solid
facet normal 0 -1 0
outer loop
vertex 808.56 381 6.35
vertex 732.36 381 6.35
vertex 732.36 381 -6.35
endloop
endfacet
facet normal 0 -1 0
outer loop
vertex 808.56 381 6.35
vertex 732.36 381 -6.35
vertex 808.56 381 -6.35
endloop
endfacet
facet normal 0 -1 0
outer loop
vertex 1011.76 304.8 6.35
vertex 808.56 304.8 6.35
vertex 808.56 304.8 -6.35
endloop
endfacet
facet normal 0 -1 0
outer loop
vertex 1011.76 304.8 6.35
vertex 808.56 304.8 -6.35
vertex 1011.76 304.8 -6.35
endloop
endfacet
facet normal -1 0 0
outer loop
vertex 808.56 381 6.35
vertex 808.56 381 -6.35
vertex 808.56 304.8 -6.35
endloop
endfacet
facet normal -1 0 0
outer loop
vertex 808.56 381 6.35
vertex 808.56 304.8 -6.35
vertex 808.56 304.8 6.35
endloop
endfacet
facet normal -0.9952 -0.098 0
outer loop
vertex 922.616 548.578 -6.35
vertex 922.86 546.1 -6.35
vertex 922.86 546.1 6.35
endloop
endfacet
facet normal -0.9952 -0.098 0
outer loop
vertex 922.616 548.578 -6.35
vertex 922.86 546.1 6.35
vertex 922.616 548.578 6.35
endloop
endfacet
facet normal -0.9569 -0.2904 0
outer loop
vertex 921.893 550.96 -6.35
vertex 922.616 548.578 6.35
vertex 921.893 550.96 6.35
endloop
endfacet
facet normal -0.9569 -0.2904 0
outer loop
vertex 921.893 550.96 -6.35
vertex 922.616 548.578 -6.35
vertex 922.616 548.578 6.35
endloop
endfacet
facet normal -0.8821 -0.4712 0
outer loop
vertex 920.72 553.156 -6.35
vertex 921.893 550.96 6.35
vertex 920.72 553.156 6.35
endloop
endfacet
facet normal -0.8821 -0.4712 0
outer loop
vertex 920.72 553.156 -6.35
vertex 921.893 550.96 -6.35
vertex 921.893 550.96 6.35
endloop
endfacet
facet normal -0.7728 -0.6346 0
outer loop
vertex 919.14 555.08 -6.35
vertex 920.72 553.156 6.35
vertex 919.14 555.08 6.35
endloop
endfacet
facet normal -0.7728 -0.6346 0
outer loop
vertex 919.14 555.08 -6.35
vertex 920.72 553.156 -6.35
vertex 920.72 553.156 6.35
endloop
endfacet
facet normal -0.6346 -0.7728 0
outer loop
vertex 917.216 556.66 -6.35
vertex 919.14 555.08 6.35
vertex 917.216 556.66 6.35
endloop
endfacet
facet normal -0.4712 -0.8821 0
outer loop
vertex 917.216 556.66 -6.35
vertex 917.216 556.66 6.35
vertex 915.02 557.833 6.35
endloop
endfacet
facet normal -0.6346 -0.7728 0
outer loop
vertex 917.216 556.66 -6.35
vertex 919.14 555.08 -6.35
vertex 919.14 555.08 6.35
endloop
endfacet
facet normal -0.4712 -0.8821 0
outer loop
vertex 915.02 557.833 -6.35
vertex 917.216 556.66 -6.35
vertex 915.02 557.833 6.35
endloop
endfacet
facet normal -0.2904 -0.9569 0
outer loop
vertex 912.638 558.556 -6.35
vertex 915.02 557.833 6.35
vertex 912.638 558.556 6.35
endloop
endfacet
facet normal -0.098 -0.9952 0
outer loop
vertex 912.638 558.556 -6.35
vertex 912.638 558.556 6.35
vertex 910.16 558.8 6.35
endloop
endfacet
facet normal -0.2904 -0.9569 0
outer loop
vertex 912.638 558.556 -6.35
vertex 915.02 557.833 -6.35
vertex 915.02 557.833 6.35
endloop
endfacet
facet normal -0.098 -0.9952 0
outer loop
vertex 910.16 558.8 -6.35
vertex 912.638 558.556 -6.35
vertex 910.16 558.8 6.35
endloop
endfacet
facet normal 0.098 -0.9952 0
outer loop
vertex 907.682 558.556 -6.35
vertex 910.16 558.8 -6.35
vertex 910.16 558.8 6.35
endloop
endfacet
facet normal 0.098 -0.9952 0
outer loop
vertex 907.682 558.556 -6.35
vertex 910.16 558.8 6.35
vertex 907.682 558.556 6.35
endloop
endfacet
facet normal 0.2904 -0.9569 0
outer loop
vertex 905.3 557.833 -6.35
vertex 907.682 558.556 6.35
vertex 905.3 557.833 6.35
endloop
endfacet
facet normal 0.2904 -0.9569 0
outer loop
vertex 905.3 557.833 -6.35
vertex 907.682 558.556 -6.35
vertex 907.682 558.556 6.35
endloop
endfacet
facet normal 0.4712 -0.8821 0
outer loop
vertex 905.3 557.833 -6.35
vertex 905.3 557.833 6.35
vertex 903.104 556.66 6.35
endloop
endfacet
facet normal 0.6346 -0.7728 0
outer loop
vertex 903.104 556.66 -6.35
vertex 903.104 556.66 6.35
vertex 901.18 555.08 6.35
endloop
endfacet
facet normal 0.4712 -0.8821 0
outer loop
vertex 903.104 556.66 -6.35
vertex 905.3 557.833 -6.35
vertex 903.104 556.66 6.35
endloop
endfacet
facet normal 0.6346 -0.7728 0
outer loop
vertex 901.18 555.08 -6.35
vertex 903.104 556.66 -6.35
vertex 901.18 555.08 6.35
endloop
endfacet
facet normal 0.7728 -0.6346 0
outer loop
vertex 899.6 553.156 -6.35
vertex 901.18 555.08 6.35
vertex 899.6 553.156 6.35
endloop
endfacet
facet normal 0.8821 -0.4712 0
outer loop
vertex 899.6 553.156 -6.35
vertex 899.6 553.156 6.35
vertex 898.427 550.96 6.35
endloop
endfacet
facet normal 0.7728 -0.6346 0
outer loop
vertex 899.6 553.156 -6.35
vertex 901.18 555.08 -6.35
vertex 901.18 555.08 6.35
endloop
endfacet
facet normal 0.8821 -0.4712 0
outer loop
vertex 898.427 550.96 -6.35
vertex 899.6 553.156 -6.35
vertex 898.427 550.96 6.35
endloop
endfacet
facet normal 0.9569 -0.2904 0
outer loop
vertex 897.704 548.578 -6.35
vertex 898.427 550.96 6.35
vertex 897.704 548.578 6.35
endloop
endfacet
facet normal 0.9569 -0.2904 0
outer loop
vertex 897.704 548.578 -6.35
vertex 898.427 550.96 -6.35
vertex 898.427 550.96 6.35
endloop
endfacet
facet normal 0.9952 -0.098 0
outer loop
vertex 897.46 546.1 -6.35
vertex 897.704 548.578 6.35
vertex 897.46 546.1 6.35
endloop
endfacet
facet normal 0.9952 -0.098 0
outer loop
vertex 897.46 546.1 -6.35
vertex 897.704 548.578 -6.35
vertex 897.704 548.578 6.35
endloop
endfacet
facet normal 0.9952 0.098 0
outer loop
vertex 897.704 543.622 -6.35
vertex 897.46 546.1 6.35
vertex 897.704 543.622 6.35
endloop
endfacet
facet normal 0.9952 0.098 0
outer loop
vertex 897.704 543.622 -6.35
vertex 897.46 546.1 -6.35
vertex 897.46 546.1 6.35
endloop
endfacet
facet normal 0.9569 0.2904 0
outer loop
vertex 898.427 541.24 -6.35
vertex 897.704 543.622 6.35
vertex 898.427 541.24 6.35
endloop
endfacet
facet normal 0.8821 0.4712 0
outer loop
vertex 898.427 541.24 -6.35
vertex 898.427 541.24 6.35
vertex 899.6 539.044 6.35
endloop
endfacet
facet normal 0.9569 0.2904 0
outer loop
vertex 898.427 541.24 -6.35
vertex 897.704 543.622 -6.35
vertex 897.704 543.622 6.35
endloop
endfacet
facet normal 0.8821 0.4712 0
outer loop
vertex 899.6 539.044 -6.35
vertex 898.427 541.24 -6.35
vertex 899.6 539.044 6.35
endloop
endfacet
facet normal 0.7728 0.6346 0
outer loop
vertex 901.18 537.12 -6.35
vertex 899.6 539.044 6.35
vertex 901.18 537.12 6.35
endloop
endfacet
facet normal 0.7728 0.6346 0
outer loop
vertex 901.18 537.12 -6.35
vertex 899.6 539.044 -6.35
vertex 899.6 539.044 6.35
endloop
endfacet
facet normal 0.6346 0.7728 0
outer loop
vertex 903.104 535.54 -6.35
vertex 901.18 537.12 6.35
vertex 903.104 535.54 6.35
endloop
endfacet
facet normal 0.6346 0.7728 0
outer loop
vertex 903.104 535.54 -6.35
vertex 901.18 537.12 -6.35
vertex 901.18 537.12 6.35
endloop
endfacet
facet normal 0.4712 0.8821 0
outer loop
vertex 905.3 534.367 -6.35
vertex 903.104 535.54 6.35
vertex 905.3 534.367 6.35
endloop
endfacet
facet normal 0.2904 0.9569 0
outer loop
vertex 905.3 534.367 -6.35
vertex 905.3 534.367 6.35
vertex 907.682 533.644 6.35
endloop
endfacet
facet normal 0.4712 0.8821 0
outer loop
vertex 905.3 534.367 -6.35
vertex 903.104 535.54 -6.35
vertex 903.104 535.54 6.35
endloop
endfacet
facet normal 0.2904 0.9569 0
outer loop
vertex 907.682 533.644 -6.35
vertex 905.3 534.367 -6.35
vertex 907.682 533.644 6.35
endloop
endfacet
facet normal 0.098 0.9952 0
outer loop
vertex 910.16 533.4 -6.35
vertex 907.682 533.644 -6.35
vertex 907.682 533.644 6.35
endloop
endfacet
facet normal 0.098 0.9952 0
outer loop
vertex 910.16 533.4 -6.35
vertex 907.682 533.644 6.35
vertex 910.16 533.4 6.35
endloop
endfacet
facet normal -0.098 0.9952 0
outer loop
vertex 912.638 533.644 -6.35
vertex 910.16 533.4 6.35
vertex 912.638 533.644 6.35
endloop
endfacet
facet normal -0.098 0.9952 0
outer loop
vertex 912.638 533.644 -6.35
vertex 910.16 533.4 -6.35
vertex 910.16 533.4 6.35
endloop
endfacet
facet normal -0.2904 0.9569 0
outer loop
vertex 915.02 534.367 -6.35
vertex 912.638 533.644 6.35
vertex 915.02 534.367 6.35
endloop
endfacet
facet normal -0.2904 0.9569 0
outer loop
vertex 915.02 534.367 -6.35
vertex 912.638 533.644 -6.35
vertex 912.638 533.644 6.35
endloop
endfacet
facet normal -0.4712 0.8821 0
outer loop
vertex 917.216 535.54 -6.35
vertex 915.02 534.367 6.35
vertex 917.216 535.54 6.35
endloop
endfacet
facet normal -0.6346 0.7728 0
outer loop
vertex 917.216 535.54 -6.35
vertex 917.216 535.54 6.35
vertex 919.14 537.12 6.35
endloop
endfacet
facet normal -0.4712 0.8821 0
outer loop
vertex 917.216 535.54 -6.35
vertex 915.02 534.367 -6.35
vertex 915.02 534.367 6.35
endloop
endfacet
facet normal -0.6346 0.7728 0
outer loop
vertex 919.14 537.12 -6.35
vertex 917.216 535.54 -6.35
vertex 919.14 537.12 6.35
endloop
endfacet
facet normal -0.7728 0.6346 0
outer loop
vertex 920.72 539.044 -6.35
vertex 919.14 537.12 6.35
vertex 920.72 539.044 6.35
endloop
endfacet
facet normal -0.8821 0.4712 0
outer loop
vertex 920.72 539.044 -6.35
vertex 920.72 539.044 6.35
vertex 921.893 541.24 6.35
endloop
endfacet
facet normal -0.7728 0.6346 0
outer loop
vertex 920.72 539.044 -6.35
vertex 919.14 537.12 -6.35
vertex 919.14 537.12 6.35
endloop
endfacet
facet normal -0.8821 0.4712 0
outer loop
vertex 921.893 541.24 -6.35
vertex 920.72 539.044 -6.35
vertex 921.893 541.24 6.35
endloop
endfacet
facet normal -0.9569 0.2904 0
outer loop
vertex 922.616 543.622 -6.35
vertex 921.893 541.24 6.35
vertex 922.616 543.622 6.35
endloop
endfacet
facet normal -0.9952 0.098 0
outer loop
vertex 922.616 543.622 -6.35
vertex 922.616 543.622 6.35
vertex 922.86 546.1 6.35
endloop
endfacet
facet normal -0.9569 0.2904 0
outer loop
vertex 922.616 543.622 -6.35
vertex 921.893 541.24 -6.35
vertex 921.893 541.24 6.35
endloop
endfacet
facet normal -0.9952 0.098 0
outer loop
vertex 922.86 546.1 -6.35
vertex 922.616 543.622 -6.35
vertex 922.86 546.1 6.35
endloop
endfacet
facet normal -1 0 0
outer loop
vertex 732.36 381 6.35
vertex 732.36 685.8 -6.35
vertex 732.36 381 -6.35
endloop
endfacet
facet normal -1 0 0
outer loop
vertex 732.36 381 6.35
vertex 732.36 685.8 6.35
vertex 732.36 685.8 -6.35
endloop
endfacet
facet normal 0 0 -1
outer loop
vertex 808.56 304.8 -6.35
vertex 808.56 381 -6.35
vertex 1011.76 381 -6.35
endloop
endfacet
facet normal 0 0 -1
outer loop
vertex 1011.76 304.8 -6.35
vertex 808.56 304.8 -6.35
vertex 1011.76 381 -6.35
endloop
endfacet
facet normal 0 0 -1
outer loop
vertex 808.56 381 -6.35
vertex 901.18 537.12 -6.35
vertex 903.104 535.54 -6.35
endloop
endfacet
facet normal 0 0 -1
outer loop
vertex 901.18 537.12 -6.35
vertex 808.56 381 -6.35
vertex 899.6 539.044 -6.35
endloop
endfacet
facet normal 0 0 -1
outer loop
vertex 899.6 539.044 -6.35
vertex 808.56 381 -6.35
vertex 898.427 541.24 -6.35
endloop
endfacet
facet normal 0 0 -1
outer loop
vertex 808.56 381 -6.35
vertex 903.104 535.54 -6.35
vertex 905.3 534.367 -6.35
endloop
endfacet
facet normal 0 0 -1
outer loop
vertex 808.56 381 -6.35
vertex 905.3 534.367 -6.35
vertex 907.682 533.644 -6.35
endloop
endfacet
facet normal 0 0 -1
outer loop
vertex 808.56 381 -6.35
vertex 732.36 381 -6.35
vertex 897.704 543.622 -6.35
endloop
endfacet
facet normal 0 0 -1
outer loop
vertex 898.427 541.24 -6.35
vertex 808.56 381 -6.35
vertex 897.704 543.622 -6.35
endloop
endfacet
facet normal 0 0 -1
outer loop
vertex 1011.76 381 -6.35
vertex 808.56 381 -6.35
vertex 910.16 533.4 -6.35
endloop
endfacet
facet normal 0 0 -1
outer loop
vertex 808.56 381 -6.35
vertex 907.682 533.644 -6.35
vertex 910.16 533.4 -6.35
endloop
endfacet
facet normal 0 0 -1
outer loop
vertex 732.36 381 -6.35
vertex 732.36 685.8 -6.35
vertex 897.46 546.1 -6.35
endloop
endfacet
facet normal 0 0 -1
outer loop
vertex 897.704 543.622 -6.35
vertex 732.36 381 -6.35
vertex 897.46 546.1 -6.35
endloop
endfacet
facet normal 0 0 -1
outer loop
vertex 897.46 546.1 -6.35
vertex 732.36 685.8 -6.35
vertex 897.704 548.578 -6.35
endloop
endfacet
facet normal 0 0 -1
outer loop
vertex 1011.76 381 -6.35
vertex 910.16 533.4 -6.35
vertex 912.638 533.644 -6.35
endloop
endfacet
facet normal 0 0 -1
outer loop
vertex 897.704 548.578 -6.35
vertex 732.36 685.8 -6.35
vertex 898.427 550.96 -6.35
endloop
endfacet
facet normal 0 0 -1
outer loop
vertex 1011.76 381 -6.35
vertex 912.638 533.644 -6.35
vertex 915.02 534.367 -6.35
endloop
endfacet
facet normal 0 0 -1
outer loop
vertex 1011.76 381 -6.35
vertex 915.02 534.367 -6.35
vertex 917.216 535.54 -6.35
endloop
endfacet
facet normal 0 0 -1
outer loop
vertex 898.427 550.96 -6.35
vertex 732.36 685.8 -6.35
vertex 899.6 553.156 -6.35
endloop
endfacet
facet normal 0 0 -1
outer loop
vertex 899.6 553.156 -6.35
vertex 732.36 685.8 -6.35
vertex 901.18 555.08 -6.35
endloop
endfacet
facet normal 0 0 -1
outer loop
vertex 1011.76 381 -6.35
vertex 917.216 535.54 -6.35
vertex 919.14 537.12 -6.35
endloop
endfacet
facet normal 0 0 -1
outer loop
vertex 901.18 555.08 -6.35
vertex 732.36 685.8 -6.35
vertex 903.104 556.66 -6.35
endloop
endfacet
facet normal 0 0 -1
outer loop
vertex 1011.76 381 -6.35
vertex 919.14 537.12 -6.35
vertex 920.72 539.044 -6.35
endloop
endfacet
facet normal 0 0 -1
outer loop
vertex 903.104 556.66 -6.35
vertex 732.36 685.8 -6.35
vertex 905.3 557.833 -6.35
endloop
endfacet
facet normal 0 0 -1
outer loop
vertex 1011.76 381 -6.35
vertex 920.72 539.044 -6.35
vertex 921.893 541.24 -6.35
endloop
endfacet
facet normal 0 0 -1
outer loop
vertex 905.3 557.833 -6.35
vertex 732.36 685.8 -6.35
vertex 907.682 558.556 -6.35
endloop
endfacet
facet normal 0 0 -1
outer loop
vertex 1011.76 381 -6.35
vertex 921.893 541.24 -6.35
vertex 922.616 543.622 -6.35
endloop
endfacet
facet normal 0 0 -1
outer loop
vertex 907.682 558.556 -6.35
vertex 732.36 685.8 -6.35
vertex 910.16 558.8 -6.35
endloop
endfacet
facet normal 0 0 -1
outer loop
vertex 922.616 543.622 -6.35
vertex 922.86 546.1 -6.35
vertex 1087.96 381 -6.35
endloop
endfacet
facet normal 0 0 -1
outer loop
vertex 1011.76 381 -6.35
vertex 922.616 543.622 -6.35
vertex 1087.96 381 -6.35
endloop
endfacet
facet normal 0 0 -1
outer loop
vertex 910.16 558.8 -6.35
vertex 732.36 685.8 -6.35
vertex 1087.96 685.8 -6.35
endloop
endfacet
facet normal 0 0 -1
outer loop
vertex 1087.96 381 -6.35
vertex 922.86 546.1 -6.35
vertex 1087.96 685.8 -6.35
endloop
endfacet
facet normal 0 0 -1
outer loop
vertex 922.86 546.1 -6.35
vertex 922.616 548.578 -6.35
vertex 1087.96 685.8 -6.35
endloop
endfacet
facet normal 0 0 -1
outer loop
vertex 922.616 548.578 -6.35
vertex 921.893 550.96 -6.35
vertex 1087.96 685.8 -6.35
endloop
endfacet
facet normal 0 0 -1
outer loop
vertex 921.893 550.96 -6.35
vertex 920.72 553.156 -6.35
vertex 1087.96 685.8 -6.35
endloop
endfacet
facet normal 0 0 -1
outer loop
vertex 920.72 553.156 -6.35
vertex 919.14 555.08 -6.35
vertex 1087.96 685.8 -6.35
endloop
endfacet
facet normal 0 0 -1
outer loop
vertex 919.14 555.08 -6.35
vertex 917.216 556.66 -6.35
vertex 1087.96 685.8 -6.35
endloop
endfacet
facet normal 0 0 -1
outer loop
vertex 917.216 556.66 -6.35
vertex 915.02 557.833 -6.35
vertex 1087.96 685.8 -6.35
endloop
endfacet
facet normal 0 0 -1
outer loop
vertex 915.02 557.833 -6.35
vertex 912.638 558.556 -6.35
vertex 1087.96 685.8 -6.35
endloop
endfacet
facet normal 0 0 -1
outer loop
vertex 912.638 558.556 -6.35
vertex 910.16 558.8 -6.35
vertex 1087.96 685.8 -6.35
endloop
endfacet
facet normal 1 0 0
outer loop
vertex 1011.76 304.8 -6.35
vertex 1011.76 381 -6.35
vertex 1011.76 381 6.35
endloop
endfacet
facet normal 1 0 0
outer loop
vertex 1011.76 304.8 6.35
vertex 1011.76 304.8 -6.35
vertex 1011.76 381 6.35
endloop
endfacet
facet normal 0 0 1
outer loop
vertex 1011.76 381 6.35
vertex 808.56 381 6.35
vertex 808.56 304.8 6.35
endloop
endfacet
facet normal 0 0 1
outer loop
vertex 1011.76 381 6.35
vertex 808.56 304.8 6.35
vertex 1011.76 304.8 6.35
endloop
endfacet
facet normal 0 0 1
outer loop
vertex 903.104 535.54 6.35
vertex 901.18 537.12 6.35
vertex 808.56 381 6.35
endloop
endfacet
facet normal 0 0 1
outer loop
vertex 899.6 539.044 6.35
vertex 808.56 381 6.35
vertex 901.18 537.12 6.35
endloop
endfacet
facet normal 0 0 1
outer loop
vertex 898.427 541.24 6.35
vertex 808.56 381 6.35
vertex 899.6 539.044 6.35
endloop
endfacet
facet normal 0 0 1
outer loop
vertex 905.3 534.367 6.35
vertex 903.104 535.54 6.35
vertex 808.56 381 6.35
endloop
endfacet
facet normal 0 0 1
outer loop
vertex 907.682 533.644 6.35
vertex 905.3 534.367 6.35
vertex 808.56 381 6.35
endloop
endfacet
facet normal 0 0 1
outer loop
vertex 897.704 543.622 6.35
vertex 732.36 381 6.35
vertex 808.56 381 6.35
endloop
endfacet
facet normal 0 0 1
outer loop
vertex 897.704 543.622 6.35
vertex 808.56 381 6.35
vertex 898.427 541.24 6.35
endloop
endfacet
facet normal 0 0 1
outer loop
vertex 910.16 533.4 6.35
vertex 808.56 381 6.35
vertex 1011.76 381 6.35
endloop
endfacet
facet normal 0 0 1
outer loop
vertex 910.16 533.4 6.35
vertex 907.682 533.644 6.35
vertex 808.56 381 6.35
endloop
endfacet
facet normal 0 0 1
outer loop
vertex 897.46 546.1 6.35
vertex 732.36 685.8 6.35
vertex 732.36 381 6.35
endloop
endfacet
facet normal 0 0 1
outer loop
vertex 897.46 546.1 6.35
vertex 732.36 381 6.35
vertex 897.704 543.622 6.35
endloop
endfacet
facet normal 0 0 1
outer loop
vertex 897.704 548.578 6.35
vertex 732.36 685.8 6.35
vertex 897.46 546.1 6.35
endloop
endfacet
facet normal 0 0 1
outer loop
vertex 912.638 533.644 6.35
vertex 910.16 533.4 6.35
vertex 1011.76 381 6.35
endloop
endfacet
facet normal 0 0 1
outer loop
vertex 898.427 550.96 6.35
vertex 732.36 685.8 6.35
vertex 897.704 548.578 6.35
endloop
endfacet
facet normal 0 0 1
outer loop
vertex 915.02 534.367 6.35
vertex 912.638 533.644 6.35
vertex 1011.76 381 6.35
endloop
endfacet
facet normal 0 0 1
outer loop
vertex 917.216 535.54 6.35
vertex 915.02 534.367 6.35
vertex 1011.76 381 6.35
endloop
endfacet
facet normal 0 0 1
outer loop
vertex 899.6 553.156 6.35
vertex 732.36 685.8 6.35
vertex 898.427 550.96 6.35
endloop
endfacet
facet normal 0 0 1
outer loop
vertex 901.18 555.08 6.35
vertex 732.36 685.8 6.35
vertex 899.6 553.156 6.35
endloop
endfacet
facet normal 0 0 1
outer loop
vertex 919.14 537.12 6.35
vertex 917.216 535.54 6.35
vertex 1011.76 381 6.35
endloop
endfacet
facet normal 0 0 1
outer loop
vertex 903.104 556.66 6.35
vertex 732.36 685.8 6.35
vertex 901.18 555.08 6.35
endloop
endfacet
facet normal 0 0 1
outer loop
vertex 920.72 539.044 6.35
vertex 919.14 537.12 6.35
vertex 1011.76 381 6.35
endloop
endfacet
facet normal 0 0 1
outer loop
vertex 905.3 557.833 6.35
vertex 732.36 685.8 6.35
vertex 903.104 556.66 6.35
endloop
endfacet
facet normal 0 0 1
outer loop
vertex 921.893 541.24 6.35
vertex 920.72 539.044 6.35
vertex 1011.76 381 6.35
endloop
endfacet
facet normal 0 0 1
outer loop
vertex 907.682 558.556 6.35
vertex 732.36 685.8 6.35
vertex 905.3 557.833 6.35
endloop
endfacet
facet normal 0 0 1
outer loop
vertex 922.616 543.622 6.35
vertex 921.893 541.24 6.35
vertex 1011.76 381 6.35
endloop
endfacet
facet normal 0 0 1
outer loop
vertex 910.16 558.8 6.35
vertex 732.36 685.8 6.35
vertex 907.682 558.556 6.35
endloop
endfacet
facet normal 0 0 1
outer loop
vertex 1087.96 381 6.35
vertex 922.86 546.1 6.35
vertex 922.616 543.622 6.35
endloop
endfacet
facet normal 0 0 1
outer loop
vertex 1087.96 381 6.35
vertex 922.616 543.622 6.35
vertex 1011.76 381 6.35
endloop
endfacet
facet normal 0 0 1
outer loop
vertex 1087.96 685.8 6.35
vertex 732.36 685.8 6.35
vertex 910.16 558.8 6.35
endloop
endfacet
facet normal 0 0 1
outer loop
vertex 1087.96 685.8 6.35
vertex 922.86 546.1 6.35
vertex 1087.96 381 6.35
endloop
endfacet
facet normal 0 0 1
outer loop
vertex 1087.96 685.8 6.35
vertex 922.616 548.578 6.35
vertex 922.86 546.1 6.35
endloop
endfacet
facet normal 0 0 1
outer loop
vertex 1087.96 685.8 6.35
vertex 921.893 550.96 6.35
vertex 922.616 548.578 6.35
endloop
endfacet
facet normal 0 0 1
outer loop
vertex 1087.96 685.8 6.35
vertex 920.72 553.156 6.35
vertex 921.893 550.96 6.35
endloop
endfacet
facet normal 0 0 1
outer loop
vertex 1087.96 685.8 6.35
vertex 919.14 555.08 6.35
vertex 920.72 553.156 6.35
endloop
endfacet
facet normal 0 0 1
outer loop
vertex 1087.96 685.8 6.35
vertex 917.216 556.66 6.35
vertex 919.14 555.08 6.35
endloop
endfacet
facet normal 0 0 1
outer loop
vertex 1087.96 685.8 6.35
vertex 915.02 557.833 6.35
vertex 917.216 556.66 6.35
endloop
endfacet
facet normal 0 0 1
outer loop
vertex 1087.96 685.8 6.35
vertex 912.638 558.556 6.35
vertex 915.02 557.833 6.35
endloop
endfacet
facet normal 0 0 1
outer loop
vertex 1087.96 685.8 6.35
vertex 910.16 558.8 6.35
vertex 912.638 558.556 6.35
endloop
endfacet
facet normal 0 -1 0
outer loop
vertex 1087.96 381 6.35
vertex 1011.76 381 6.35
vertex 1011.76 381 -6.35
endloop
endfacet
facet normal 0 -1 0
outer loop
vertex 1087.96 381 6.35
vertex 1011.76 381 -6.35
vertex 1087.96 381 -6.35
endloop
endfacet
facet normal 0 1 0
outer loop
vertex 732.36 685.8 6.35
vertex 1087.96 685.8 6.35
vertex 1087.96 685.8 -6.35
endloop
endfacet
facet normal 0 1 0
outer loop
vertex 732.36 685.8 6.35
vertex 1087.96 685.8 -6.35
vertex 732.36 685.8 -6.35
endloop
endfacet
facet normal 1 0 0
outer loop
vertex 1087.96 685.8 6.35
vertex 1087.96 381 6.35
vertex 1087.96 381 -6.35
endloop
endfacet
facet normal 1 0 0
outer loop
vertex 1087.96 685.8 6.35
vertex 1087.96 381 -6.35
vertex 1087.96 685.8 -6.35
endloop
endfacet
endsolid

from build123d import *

# Parameters (mm, degrees)
BOSS_EXTRUDE1_DEPTH = 6.35
SKETCH3_W           = 203.2
SKETCH3_H           = 12.7
BOSS_EXTRUDE2_DEPTH = 76.2
CAVITY1_START       = -6.35
CAVITY1_OUTLINE_R   = 12.7
CAVITY1_DEPTH       = 12.7


# Read off the part's stored shape, not the designer's step: Cavity1
with BuildPart() as part:
    # Sketch1 → Boss-Extrude1 (new, symmetric)
    with BuildSketch(Plane.XY):
        Polygon((732.36, 381), (785.7, 381), (1001.6, 381), (1087.96, 381), (1087.96, 685.8), (1001.6, 685.8), (785.7, 685.8), (732.36, 685.8), align=None)
    extrude(amount=BOSS_EXTRUDE1_DEPTH, both=True)

    # Sketch3 → Boss-Extrude2 (add)
    with BuildSketch(Plane.XZ.offset(-381)):
        with Locations((910.16, 0)):
            Rectangle(SKETCH3_W, SKETCH3_H)
    extrude(amount=BOSS_EXTRUDE2_DEPTH)

    # Cavity1 outline → Cavity1 (cut)
    with BuildSketch(Plane.XY.offset(CAVITY1_START)):
        with Locations((910.16, 546.1)):
            Circle(CAVITY1_OUTLINE_R)
    extrude(amount=CAVITY1_DEPTH, mode=Mode.SUBTRACT)


solid = part.part
